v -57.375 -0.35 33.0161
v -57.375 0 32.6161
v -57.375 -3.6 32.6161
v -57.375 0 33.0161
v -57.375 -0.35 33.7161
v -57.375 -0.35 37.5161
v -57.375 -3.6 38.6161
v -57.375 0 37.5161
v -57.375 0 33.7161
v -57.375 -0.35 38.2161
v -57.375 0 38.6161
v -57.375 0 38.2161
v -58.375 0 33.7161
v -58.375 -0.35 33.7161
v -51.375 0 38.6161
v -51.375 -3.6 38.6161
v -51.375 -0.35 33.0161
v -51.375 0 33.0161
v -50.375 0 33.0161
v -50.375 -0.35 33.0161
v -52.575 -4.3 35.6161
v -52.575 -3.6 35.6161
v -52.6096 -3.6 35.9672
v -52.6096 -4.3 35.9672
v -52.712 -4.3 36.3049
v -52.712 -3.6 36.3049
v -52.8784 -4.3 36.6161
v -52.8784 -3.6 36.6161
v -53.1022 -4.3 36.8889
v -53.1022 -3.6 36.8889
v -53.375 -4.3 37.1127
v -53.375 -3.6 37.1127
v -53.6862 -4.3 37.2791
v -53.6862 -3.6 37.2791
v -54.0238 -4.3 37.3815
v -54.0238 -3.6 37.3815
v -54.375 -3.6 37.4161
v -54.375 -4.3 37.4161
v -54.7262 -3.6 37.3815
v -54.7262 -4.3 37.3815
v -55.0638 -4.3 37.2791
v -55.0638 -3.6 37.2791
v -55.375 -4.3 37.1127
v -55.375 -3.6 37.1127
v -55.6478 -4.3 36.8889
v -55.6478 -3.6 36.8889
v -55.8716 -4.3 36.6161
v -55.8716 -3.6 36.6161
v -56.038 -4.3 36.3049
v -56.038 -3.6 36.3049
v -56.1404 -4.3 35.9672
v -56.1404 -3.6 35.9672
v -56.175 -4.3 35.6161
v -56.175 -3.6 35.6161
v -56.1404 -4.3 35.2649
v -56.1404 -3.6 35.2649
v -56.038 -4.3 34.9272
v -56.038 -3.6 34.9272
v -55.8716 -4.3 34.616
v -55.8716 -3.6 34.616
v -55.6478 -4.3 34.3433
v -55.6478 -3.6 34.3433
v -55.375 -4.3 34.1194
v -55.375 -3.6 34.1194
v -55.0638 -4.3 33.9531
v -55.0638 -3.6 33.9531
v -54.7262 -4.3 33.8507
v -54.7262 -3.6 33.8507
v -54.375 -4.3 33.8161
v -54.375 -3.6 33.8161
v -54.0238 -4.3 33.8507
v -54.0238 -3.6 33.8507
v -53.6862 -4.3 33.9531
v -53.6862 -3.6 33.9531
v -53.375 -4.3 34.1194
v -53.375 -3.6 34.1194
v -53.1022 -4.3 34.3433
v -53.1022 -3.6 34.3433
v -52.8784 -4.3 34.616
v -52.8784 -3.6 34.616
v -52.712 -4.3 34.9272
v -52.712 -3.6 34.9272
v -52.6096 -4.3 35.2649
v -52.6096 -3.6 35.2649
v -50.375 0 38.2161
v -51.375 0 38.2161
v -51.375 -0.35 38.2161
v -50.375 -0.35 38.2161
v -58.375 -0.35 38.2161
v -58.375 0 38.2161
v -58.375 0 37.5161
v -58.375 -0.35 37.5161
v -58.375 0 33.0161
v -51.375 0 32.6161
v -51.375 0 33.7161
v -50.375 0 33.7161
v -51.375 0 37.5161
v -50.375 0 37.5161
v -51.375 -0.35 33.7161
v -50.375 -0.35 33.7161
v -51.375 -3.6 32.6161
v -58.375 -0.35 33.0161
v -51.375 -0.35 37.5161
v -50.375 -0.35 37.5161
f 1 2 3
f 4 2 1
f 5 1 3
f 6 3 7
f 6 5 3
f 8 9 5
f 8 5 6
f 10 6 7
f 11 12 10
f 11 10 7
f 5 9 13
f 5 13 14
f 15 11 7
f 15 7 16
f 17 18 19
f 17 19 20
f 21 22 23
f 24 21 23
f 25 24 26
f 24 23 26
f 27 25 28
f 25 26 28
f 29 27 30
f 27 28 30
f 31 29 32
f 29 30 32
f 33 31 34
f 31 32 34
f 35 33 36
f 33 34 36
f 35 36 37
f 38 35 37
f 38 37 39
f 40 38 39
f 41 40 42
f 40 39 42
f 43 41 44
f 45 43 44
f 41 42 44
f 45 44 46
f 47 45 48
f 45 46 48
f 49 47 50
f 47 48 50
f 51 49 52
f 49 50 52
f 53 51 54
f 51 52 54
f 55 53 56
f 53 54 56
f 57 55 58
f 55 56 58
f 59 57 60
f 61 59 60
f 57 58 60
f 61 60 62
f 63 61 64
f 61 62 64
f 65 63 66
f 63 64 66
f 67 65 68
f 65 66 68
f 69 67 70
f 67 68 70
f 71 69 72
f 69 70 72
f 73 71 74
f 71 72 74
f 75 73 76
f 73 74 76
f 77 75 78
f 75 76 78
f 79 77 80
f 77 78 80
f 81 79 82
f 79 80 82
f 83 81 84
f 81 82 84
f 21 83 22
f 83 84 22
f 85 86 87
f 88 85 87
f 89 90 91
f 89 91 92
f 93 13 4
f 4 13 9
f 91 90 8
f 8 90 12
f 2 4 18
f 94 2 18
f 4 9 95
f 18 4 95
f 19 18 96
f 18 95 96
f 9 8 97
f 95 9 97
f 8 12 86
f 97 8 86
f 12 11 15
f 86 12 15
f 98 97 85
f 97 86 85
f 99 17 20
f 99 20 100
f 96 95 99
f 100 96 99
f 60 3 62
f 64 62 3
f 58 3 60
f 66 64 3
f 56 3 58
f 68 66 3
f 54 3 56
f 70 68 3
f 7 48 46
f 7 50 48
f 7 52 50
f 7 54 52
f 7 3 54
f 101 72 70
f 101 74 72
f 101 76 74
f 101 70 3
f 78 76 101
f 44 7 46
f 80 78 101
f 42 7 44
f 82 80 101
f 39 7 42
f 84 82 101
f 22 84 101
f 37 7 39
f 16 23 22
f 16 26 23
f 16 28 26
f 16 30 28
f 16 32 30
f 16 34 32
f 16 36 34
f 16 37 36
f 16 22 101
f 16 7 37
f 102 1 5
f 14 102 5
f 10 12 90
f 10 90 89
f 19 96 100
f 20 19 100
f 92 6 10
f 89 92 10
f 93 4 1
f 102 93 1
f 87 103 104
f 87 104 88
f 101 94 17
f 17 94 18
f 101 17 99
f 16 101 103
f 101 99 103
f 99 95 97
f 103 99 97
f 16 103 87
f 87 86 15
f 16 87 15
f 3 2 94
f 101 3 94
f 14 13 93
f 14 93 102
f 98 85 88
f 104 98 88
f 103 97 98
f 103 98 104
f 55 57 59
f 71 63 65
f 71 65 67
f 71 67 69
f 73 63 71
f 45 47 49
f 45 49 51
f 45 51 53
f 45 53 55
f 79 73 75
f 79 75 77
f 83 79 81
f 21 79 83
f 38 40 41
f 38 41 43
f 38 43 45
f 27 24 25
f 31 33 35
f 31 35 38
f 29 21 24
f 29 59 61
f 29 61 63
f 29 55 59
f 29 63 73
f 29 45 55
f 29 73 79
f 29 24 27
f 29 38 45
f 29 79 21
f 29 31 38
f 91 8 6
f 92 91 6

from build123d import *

# Parameters (mm, degrees)
F0_W          = 6
F0_H          = 6
F1_DEPTH      = 3.6
F2_R          = 1.8
F3_DEPTH      = 0.7
F4_W          = 0.35
F4_H          = 0.7
F5_DEPTH      = 1
F5_DEPTH_BACK = 7


with BuildPart() as f1:
    # F0 (on Front) → F1 (new body)
    with BuildSketch(Plane.XZ):
        with Locations((-54.375002, 35.616073)):
            Rectangle(F0_W, F0_H)
    extrude(amount=F1_DEPTH)

    # F2 (on face) → F3 (join)
    with BuildSketch(Plane.XZ.offset(3.6)):
        with Locations((-54.375002, 35.616073)):
            Circle(F2_R)
    extrude(amount=F3_DEPTH)

    # F4 (on face) → F5 (join, two sides)
    with BuildSketch(Plane(origin=(-57.375002, 0, 0), x_dir=(0, -1, 0), z_dir=(-1, 0, 0))) as f5_sk:
        with Locations((0.175, 37.866073)):
            Rectangle(F4_W, F4_H)
        with Locations((0.175, 33.366073)):
            Rectangle(F4_W, F4_H)
    extrude(amount=F5_DEPTH)
    extrude(f5_sk.sketch, amount=-F5_DEPTH_BACK)


solid = f1.part
